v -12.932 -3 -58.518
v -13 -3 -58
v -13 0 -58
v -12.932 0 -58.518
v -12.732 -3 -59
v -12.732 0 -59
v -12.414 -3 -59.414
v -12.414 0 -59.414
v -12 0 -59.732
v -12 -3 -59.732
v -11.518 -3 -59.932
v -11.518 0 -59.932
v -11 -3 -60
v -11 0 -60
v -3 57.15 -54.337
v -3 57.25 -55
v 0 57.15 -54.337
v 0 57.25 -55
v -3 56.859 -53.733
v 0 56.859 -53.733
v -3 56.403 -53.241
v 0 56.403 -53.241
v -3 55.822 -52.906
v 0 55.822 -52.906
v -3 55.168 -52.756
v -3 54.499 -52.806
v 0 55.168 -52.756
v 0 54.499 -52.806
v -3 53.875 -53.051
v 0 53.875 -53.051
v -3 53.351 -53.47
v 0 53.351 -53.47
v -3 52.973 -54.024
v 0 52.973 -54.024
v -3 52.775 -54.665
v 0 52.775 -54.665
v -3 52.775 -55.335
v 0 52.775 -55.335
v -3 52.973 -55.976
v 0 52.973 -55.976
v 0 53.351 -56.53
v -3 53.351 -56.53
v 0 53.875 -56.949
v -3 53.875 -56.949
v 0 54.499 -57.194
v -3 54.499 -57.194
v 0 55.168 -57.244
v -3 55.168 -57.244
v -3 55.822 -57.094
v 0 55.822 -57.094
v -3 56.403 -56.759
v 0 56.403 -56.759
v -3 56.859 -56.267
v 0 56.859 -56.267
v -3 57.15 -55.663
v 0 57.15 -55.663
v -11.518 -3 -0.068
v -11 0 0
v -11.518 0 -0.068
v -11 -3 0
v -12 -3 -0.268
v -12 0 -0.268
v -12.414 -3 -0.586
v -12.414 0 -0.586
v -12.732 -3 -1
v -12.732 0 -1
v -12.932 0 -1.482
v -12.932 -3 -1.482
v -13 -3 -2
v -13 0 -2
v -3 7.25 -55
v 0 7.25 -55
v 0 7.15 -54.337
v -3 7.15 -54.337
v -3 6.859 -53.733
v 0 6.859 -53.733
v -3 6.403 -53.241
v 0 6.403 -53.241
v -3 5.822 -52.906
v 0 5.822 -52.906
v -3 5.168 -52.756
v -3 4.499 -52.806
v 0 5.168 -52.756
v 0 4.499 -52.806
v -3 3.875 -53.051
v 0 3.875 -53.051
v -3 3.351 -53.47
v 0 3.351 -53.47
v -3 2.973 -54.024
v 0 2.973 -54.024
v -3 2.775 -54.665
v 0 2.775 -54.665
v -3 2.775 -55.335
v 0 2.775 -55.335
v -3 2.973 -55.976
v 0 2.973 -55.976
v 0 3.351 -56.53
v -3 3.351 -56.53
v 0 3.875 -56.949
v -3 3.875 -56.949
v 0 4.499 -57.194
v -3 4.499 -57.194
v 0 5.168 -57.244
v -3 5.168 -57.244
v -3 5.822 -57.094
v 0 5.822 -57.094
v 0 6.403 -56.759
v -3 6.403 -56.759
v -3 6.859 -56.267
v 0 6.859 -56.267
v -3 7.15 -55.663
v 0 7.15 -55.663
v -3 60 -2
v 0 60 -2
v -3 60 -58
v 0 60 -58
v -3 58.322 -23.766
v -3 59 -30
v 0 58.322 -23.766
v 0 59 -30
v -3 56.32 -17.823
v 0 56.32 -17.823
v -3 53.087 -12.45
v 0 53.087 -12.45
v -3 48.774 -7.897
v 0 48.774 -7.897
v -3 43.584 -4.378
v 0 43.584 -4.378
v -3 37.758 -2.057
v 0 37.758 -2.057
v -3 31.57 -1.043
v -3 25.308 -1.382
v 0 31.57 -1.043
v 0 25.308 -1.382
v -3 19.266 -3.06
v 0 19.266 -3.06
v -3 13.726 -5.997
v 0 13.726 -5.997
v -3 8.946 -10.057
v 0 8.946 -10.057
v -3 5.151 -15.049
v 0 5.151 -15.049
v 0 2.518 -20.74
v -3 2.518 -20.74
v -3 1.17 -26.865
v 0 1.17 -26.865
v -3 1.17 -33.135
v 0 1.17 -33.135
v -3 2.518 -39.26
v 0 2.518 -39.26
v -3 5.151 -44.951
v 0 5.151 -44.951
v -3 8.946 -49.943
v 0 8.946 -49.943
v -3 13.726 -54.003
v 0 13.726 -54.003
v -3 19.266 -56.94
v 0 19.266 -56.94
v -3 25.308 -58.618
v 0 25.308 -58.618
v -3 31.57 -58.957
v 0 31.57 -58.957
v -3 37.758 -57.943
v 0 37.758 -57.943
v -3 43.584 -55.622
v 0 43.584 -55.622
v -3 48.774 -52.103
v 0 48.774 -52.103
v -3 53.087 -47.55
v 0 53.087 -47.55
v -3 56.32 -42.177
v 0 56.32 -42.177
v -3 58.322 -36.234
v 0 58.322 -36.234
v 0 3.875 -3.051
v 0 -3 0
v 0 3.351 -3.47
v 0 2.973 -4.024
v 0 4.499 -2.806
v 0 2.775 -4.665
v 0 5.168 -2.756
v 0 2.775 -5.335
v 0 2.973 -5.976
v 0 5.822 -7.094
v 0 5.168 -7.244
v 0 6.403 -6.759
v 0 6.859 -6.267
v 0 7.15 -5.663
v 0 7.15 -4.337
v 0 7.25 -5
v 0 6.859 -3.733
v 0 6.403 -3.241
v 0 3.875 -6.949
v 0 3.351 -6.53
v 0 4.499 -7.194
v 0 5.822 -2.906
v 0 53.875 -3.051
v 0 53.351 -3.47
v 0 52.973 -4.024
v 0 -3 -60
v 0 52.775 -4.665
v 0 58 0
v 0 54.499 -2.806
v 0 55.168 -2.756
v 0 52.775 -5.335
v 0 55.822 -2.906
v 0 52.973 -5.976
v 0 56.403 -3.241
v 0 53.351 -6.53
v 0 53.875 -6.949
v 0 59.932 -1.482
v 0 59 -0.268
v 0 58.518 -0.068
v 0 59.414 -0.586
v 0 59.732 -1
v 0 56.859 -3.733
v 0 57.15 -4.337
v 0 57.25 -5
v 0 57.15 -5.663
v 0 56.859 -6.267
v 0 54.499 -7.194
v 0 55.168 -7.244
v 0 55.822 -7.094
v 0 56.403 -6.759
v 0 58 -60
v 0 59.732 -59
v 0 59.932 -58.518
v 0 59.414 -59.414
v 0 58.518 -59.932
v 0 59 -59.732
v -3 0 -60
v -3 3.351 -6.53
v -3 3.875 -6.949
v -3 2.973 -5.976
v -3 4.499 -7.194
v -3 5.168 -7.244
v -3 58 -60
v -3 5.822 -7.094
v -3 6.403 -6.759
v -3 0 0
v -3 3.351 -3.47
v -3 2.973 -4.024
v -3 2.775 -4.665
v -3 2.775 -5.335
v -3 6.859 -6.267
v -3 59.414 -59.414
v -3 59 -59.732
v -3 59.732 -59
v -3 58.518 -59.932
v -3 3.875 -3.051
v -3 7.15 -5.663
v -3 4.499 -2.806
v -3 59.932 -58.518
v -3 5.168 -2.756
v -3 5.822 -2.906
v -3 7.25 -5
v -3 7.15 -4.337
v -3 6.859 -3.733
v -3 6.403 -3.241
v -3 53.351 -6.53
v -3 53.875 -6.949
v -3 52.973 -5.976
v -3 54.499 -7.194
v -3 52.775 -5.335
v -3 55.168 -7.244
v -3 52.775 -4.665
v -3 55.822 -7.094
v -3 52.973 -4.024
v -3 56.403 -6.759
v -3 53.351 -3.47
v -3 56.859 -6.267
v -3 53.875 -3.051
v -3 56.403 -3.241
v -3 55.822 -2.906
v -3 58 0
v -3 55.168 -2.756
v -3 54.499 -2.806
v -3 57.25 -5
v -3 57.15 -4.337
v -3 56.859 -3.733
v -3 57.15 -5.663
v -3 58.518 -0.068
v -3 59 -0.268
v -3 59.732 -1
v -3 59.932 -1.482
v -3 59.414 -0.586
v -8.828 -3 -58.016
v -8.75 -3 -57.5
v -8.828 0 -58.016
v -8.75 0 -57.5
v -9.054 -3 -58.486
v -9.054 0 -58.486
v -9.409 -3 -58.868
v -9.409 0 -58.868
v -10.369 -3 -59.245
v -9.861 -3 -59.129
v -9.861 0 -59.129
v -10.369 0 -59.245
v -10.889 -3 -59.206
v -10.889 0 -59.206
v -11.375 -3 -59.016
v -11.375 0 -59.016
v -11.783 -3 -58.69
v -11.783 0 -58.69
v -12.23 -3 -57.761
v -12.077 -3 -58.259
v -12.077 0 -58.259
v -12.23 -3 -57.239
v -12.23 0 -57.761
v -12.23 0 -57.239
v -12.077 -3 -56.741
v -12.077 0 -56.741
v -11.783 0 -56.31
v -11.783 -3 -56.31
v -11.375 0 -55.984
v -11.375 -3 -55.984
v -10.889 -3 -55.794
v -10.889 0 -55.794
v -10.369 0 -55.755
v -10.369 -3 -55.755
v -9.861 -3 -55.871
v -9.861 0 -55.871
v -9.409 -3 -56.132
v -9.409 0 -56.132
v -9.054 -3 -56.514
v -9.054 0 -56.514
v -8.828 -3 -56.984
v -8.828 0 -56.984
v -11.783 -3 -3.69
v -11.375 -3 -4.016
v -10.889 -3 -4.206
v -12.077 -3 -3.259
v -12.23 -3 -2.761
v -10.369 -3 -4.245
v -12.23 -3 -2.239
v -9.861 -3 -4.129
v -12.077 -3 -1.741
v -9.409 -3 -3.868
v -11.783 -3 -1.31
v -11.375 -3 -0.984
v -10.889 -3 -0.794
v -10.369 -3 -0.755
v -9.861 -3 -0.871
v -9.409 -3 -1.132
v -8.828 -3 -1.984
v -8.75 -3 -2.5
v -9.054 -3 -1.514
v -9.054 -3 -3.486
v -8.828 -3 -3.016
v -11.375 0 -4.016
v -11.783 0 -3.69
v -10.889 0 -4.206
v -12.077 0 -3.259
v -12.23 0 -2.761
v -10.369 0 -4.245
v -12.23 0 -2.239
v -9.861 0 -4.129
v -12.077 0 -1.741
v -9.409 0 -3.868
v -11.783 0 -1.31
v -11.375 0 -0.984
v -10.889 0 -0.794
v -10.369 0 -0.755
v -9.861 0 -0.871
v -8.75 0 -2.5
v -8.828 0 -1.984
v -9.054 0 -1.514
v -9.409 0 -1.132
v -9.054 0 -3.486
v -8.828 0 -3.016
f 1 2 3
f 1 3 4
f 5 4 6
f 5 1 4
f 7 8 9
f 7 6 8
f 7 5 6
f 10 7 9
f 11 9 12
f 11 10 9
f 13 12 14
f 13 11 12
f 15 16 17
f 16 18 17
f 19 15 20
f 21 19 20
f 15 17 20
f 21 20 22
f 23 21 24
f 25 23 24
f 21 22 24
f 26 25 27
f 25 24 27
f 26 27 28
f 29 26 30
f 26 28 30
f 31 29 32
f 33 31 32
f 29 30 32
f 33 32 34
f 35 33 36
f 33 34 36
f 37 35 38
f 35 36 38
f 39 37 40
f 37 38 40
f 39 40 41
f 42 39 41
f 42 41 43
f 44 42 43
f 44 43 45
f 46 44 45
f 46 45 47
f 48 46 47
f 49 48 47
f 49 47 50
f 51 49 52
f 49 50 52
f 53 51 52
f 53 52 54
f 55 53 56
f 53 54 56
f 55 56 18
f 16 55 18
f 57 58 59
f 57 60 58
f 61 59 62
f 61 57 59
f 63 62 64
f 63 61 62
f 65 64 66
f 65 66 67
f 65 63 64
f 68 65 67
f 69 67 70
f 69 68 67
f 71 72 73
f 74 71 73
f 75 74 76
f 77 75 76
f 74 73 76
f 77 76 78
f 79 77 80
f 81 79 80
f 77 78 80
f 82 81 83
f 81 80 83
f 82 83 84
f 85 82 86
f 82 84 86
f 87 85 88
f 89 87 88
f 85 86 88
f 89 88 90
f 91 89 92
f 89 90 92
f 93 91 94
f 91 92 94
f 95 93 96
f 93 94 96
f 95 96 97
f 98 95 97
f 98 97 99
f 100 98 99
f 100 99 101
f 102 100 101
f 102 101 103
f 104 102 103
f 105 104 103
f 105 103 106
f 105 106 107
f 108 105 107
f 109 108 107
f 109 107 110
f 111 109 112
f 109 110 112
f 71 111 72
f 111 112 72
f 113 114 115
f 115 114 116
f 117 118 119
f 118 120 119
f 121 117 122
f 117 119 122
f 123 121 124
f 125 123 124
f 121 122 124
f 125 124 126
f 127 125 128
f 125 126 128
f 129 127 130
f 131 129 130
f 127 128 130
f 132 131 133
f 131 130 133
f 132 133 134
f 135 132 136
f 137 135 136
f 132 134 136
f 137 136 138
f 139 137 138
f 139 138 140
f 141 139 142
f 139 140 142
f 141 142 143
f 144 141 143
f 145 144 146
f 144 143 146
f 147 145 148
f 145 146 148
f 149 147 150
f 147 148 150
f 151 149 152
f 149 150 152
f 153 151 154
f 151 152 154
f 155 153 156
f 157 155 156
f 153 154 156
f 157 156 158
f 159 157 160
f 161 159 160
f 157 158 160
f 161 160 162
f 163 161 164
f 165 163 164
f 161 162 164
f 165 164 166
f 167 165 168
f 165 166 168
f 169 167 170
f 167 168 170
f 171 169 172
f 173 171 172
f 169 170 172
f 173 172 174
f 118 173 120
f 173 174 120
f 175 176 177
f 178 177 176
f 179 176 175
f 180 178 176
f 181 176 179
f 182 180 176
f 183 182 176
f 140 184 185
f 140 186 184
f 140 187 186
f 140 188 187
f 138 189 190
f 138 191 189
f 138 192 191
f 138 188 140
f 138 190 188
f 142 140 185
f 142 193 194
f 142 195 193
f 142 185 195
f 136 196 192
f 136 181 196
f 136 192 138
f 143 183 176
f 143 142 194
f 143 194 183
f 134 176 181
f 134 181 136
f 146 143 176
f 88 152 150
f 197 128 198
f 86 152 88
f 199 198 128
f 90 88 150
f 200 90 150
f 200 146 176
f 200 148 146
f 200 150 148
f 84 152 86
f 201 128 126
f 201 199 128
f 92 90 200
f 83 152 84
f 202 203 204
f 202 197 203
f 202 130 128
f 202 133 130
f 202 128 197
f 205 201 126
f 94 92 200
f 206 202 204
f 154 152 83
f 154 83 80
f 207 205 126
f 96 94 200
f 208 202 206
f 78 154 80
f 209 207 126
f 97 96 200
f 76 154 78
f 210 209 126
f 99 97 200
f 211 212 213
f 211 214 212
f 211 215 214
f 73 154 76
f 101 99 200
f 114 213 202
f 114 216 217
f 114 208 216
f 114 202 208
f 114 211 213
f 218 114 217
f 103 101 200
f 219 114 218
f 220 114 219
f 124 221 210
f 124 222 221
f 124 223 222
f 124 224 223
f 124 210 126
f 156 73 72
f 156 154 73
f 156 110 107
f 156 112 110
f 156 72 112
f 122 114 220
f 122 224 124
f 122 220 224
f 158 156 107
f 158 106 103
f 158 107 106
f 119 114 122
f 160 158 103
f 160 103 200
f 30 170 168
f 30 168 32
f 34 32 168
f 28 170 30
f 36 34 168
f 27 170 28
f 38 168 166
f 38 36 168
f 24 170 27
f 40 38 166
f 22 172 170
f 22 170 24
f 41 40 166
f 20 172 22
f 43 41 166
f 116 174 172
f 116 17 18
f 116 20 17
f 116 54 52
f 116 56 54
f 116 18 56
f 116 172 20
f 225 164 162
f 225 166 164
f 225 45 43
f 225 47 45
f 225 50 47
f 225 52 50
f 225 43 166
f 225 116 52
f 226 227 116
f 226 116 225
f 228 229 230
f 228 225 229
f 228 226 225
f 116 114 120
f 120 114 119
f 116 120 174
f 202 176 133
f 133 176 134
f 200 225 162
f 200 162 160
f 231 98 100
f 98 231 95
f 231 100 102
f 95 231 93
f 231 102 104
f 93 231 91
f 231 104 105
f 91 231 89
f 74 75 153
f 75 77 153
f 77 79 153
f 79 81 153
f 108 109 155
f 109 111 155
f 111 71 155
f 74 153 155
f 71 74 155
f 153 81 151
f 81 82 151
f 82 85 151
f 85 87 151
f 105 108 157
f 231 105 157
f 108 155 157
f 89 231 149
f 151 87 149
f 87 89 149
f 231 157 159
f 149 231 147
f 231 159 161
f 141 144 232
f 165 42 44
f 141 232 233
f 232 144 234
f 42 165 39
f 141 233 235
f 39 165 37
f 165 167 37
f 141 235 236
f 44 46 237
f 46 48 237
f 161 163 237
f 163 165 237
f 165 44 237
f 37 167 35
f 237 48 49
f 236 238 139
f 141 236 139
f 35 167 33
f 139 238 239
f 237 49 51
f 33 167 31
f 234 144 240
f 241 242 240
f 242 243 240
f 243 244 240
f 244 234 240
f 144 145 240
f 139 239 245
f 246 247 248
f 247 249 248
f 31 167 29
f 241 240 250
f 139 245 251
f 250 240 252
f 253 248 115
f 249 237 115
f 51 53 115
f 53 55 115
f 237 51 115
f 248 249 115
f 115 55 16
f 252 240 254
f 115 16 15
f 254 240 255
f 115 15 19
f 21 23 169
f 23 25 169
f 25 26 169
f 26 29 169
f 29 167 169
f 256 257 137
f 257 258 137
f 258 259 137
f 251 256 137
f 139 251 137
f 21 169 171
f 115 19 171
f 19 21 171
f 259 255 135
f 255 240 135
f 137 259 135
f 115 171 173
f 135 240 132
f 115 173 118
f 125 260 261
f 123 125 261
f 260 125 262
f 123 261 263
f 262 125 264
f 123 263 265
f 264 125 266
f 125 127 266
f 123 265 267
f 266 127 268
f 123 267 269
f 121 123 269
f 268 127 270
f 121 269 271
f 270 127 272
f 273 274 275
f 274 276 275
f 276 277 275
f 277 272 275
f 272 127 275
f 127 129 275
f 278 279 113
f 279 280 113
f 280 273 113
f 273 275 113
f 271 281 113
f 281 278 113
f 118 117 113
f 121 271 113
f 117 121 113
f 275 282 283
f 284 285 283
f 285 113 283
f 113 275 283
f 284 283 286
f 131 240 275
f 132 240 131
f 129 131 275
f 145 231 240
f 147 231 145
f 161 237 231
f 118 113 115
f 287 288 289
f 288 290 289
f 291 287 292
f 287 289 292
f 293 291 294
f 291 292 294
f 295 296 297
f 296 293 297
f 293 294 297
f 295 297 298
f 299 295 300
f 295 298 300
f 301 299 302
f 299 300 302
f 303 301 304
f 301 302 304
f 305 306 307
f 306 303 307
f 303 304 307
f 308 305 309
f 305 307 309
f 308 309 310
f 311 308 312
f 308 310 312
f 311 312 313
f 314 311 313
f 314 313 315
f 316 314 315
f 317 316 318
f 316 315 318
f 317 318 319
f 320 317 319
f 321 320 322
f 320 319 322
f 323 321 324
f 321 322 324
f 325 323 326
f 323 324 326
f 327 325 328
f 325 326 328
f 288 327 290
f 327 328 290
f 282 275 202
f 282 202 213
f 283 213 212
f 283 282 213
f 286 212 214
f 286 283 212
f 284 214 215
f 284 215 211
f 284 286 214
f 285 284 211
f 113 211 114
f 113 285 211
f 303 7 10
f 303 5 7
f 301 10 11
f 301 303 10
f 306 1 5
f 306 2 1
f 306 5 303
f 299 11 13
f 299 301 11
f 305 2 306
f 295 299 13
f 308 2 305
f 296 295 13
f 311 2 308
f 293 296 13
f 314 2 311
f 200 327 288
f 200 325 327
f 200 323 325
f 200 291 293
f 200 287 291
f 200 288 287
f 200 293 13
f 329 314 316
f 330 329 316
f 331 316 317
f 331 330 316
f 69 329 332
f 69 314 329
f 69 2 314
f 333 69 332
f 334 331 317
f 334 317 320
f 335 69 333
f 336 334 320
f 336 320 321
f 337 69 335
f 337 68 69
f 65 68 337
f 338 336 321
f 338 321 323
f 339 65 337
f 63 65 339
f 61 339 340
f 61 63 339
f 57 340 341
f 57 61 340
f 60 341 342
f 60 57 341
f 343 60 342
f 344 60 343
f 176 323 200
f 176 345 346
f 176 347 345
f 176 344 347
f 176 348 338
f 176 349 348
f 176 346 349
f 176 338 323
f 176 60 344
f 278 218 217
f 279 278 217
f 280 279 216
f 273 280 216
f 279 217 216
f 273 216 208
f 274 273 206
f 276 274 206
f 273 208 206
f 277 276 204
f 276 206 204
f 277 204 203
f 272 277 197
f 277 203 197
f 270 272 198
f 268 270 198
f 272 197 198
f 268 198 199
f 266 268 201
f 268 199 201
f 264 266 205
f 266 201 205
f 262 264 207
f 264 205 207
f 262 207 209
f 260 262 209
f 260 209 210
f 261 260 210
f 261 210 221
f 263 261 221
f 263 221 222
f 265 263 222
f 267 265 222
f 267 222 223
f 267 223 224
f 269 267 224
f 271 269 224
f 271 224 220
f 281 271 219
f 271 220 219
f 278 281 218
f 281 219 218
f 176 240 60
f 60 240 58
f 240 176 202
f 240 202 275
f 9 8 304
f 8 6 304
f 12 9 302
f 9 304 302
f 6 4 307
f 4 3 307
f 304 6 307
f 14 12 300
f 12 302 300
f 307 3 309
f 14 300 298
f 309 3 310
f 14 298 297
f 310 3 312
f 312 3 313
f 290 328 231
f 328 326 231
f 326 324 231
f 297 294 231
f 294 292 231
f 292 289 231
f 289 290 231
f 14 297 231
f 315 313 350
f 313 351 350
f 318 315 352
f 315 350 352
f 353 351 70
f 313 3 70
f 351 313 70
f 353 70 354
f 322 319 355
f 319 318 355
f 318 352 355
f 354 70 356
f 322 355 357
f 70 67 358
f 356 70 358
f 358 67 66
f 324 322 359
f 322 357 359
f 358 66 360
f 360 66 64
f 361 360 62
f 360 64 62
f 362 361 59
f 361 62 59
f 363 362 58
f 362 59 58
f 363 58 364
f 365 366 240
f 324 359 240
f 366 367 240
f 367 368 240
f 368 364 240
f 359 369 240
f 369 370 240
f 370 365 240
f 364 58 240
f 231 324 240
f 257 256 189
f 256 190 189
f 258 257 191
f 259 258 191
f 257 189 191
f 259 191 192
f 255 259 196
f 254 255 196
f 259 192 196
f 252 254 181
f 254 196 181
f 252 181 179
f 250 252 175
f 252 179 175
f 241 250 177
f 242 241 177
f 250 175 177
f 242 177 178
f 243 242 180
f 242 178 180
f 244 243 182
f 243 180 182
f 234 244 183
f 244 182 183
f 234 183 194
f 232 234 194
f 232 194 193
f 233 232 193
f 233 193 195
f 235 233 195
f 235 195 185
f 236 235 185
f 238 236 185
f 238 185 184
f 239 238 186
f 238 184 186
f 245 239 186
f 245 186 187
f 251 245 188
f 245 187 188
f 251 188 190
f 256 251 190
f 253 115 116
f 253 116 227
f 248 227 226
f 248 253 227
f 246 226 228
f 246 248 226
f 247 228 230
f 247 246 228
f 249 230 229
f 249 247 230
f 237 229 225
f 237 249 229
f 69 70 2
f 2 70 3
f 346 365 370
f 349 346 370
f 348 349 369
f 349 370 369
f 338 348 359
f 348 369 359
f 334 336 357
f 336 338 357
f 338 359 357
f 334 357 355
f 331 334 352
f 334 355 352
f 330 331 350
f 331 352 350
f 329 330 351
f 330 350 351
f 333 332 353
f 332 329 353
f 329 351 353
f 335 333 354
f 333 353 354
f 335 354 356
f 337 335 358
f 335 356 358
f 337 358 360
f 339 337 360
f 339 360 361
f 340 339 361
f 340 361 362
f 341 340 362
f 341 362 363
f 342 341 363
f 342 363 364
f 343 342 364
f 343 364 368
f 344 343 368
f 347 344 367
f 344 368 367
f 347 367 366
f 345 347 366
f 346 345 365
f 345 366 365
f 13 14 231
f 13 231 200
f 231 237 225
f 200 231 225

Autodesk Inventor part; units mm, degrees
ref_plane "YZ Plane" through (0, 0, 0) normal (1, 0, 0) x (0, 1, 0)
ref_plane "XZ Plane" through (0, 0, 0) normal (0, 1, 0) x (-1, 0, 0)
ref_plane "XY Plane" through (0, 0, 0) normal (0, 0, 1) x (1, 0, 0)
sketch "Skizze1" plane through (0, 0, 0) normal (1, 0, 0) x (0, 1, 0)
  line L0 (0, 0) -> (60, 0)
  line L1 (60, 0) -> (60, -60)
  line L2 (60, -60) -> (0, -60)
  line L3 (0, -60) -> (0, 0)
  line L4 (0, -30) -> (60, -30) construction
  line L5 (30, 0) -> (30, -60) construction
  circle A0 centre (30, -30) radius 29
  line L6 (0, -5) -> (60, -5) construction
  line L7 (60, -55) -> (0, -55) construction
  line L8 (5, 0) -> (5, -60) construction
  line L9 (55, -60) -> (55, 0) construction
  circle A1 centre (55, -5) radius 2.25
  circle A2 centre (55, -55) radius 2.25
  circle A3 centre (5, -55) radius 2.25
  circle A4 centre (5, -5) radius 2.25
  dimension "d0" = 60
  dimension "d1" = 60
  dimension "d2" = 58
  dimension "d3" = 5
  dimension "d4" = 5
  dimension "d5" = 5
  dimension "d6" = 5
  dimension "d7" = 4.5
  dimension "d8" = 4.5
  dimension "d9" = 4.5
  dimension "d10" = 4.5
extrude "Extrusion1" add sketch "Skizze1" against normal blind 3
sketch "Skizze2" plane through (0, 0, -60) normal (0, -1, 0) x (1, 0, 0)
  line L0 (0, 60) -> (-13, 60)
  line L1 (-13, 60) -> (-13, 0)
  line L2 (-13, 0) -> (0, 0)
  line L3 (-1.5, 60) -> (-1.5, 0) construction
  line L4 (0, 60) -> (-3, 60) projected
  line L5 (0, 60) -> (0, 0) projected
  line L6 (-10.5, 0) -> (-10.5, 60) construction
  line L7 (5, 57.5) -> (-13, 57.5) construction
  line L8 (5, 2.5) -> (-13, 2.5) construction
  circle A0 centre (-10.5, 57.5) radius 1.75
  circle A1 centre (-10.5, 2.5) radius 1.75
  line L9 (0, 60) -> (0, 0)
  point P0 (-3, 0)
  dimension "d13" = 13
  dimension "d14" = 1.5
  dimension "d17" = 2.5
  dimension "d18" = 2.5
  dimension "d19" = 2.5
  dimension "d21" = 3.5
  dimension "d23" = 3.5
fillet "Rundung1" radius 2 2 edges at (-1.5, 60, -60) (-1.5, 60, 0)
extrude "Extrusion4" add sketch "Skizze2" along normal blind 3
fillet "Rundung2" radius 2 2 edges at (-13, -1.5, 0) (-13, -1.5, -60)
properties part number "Halter_Lüfter"
